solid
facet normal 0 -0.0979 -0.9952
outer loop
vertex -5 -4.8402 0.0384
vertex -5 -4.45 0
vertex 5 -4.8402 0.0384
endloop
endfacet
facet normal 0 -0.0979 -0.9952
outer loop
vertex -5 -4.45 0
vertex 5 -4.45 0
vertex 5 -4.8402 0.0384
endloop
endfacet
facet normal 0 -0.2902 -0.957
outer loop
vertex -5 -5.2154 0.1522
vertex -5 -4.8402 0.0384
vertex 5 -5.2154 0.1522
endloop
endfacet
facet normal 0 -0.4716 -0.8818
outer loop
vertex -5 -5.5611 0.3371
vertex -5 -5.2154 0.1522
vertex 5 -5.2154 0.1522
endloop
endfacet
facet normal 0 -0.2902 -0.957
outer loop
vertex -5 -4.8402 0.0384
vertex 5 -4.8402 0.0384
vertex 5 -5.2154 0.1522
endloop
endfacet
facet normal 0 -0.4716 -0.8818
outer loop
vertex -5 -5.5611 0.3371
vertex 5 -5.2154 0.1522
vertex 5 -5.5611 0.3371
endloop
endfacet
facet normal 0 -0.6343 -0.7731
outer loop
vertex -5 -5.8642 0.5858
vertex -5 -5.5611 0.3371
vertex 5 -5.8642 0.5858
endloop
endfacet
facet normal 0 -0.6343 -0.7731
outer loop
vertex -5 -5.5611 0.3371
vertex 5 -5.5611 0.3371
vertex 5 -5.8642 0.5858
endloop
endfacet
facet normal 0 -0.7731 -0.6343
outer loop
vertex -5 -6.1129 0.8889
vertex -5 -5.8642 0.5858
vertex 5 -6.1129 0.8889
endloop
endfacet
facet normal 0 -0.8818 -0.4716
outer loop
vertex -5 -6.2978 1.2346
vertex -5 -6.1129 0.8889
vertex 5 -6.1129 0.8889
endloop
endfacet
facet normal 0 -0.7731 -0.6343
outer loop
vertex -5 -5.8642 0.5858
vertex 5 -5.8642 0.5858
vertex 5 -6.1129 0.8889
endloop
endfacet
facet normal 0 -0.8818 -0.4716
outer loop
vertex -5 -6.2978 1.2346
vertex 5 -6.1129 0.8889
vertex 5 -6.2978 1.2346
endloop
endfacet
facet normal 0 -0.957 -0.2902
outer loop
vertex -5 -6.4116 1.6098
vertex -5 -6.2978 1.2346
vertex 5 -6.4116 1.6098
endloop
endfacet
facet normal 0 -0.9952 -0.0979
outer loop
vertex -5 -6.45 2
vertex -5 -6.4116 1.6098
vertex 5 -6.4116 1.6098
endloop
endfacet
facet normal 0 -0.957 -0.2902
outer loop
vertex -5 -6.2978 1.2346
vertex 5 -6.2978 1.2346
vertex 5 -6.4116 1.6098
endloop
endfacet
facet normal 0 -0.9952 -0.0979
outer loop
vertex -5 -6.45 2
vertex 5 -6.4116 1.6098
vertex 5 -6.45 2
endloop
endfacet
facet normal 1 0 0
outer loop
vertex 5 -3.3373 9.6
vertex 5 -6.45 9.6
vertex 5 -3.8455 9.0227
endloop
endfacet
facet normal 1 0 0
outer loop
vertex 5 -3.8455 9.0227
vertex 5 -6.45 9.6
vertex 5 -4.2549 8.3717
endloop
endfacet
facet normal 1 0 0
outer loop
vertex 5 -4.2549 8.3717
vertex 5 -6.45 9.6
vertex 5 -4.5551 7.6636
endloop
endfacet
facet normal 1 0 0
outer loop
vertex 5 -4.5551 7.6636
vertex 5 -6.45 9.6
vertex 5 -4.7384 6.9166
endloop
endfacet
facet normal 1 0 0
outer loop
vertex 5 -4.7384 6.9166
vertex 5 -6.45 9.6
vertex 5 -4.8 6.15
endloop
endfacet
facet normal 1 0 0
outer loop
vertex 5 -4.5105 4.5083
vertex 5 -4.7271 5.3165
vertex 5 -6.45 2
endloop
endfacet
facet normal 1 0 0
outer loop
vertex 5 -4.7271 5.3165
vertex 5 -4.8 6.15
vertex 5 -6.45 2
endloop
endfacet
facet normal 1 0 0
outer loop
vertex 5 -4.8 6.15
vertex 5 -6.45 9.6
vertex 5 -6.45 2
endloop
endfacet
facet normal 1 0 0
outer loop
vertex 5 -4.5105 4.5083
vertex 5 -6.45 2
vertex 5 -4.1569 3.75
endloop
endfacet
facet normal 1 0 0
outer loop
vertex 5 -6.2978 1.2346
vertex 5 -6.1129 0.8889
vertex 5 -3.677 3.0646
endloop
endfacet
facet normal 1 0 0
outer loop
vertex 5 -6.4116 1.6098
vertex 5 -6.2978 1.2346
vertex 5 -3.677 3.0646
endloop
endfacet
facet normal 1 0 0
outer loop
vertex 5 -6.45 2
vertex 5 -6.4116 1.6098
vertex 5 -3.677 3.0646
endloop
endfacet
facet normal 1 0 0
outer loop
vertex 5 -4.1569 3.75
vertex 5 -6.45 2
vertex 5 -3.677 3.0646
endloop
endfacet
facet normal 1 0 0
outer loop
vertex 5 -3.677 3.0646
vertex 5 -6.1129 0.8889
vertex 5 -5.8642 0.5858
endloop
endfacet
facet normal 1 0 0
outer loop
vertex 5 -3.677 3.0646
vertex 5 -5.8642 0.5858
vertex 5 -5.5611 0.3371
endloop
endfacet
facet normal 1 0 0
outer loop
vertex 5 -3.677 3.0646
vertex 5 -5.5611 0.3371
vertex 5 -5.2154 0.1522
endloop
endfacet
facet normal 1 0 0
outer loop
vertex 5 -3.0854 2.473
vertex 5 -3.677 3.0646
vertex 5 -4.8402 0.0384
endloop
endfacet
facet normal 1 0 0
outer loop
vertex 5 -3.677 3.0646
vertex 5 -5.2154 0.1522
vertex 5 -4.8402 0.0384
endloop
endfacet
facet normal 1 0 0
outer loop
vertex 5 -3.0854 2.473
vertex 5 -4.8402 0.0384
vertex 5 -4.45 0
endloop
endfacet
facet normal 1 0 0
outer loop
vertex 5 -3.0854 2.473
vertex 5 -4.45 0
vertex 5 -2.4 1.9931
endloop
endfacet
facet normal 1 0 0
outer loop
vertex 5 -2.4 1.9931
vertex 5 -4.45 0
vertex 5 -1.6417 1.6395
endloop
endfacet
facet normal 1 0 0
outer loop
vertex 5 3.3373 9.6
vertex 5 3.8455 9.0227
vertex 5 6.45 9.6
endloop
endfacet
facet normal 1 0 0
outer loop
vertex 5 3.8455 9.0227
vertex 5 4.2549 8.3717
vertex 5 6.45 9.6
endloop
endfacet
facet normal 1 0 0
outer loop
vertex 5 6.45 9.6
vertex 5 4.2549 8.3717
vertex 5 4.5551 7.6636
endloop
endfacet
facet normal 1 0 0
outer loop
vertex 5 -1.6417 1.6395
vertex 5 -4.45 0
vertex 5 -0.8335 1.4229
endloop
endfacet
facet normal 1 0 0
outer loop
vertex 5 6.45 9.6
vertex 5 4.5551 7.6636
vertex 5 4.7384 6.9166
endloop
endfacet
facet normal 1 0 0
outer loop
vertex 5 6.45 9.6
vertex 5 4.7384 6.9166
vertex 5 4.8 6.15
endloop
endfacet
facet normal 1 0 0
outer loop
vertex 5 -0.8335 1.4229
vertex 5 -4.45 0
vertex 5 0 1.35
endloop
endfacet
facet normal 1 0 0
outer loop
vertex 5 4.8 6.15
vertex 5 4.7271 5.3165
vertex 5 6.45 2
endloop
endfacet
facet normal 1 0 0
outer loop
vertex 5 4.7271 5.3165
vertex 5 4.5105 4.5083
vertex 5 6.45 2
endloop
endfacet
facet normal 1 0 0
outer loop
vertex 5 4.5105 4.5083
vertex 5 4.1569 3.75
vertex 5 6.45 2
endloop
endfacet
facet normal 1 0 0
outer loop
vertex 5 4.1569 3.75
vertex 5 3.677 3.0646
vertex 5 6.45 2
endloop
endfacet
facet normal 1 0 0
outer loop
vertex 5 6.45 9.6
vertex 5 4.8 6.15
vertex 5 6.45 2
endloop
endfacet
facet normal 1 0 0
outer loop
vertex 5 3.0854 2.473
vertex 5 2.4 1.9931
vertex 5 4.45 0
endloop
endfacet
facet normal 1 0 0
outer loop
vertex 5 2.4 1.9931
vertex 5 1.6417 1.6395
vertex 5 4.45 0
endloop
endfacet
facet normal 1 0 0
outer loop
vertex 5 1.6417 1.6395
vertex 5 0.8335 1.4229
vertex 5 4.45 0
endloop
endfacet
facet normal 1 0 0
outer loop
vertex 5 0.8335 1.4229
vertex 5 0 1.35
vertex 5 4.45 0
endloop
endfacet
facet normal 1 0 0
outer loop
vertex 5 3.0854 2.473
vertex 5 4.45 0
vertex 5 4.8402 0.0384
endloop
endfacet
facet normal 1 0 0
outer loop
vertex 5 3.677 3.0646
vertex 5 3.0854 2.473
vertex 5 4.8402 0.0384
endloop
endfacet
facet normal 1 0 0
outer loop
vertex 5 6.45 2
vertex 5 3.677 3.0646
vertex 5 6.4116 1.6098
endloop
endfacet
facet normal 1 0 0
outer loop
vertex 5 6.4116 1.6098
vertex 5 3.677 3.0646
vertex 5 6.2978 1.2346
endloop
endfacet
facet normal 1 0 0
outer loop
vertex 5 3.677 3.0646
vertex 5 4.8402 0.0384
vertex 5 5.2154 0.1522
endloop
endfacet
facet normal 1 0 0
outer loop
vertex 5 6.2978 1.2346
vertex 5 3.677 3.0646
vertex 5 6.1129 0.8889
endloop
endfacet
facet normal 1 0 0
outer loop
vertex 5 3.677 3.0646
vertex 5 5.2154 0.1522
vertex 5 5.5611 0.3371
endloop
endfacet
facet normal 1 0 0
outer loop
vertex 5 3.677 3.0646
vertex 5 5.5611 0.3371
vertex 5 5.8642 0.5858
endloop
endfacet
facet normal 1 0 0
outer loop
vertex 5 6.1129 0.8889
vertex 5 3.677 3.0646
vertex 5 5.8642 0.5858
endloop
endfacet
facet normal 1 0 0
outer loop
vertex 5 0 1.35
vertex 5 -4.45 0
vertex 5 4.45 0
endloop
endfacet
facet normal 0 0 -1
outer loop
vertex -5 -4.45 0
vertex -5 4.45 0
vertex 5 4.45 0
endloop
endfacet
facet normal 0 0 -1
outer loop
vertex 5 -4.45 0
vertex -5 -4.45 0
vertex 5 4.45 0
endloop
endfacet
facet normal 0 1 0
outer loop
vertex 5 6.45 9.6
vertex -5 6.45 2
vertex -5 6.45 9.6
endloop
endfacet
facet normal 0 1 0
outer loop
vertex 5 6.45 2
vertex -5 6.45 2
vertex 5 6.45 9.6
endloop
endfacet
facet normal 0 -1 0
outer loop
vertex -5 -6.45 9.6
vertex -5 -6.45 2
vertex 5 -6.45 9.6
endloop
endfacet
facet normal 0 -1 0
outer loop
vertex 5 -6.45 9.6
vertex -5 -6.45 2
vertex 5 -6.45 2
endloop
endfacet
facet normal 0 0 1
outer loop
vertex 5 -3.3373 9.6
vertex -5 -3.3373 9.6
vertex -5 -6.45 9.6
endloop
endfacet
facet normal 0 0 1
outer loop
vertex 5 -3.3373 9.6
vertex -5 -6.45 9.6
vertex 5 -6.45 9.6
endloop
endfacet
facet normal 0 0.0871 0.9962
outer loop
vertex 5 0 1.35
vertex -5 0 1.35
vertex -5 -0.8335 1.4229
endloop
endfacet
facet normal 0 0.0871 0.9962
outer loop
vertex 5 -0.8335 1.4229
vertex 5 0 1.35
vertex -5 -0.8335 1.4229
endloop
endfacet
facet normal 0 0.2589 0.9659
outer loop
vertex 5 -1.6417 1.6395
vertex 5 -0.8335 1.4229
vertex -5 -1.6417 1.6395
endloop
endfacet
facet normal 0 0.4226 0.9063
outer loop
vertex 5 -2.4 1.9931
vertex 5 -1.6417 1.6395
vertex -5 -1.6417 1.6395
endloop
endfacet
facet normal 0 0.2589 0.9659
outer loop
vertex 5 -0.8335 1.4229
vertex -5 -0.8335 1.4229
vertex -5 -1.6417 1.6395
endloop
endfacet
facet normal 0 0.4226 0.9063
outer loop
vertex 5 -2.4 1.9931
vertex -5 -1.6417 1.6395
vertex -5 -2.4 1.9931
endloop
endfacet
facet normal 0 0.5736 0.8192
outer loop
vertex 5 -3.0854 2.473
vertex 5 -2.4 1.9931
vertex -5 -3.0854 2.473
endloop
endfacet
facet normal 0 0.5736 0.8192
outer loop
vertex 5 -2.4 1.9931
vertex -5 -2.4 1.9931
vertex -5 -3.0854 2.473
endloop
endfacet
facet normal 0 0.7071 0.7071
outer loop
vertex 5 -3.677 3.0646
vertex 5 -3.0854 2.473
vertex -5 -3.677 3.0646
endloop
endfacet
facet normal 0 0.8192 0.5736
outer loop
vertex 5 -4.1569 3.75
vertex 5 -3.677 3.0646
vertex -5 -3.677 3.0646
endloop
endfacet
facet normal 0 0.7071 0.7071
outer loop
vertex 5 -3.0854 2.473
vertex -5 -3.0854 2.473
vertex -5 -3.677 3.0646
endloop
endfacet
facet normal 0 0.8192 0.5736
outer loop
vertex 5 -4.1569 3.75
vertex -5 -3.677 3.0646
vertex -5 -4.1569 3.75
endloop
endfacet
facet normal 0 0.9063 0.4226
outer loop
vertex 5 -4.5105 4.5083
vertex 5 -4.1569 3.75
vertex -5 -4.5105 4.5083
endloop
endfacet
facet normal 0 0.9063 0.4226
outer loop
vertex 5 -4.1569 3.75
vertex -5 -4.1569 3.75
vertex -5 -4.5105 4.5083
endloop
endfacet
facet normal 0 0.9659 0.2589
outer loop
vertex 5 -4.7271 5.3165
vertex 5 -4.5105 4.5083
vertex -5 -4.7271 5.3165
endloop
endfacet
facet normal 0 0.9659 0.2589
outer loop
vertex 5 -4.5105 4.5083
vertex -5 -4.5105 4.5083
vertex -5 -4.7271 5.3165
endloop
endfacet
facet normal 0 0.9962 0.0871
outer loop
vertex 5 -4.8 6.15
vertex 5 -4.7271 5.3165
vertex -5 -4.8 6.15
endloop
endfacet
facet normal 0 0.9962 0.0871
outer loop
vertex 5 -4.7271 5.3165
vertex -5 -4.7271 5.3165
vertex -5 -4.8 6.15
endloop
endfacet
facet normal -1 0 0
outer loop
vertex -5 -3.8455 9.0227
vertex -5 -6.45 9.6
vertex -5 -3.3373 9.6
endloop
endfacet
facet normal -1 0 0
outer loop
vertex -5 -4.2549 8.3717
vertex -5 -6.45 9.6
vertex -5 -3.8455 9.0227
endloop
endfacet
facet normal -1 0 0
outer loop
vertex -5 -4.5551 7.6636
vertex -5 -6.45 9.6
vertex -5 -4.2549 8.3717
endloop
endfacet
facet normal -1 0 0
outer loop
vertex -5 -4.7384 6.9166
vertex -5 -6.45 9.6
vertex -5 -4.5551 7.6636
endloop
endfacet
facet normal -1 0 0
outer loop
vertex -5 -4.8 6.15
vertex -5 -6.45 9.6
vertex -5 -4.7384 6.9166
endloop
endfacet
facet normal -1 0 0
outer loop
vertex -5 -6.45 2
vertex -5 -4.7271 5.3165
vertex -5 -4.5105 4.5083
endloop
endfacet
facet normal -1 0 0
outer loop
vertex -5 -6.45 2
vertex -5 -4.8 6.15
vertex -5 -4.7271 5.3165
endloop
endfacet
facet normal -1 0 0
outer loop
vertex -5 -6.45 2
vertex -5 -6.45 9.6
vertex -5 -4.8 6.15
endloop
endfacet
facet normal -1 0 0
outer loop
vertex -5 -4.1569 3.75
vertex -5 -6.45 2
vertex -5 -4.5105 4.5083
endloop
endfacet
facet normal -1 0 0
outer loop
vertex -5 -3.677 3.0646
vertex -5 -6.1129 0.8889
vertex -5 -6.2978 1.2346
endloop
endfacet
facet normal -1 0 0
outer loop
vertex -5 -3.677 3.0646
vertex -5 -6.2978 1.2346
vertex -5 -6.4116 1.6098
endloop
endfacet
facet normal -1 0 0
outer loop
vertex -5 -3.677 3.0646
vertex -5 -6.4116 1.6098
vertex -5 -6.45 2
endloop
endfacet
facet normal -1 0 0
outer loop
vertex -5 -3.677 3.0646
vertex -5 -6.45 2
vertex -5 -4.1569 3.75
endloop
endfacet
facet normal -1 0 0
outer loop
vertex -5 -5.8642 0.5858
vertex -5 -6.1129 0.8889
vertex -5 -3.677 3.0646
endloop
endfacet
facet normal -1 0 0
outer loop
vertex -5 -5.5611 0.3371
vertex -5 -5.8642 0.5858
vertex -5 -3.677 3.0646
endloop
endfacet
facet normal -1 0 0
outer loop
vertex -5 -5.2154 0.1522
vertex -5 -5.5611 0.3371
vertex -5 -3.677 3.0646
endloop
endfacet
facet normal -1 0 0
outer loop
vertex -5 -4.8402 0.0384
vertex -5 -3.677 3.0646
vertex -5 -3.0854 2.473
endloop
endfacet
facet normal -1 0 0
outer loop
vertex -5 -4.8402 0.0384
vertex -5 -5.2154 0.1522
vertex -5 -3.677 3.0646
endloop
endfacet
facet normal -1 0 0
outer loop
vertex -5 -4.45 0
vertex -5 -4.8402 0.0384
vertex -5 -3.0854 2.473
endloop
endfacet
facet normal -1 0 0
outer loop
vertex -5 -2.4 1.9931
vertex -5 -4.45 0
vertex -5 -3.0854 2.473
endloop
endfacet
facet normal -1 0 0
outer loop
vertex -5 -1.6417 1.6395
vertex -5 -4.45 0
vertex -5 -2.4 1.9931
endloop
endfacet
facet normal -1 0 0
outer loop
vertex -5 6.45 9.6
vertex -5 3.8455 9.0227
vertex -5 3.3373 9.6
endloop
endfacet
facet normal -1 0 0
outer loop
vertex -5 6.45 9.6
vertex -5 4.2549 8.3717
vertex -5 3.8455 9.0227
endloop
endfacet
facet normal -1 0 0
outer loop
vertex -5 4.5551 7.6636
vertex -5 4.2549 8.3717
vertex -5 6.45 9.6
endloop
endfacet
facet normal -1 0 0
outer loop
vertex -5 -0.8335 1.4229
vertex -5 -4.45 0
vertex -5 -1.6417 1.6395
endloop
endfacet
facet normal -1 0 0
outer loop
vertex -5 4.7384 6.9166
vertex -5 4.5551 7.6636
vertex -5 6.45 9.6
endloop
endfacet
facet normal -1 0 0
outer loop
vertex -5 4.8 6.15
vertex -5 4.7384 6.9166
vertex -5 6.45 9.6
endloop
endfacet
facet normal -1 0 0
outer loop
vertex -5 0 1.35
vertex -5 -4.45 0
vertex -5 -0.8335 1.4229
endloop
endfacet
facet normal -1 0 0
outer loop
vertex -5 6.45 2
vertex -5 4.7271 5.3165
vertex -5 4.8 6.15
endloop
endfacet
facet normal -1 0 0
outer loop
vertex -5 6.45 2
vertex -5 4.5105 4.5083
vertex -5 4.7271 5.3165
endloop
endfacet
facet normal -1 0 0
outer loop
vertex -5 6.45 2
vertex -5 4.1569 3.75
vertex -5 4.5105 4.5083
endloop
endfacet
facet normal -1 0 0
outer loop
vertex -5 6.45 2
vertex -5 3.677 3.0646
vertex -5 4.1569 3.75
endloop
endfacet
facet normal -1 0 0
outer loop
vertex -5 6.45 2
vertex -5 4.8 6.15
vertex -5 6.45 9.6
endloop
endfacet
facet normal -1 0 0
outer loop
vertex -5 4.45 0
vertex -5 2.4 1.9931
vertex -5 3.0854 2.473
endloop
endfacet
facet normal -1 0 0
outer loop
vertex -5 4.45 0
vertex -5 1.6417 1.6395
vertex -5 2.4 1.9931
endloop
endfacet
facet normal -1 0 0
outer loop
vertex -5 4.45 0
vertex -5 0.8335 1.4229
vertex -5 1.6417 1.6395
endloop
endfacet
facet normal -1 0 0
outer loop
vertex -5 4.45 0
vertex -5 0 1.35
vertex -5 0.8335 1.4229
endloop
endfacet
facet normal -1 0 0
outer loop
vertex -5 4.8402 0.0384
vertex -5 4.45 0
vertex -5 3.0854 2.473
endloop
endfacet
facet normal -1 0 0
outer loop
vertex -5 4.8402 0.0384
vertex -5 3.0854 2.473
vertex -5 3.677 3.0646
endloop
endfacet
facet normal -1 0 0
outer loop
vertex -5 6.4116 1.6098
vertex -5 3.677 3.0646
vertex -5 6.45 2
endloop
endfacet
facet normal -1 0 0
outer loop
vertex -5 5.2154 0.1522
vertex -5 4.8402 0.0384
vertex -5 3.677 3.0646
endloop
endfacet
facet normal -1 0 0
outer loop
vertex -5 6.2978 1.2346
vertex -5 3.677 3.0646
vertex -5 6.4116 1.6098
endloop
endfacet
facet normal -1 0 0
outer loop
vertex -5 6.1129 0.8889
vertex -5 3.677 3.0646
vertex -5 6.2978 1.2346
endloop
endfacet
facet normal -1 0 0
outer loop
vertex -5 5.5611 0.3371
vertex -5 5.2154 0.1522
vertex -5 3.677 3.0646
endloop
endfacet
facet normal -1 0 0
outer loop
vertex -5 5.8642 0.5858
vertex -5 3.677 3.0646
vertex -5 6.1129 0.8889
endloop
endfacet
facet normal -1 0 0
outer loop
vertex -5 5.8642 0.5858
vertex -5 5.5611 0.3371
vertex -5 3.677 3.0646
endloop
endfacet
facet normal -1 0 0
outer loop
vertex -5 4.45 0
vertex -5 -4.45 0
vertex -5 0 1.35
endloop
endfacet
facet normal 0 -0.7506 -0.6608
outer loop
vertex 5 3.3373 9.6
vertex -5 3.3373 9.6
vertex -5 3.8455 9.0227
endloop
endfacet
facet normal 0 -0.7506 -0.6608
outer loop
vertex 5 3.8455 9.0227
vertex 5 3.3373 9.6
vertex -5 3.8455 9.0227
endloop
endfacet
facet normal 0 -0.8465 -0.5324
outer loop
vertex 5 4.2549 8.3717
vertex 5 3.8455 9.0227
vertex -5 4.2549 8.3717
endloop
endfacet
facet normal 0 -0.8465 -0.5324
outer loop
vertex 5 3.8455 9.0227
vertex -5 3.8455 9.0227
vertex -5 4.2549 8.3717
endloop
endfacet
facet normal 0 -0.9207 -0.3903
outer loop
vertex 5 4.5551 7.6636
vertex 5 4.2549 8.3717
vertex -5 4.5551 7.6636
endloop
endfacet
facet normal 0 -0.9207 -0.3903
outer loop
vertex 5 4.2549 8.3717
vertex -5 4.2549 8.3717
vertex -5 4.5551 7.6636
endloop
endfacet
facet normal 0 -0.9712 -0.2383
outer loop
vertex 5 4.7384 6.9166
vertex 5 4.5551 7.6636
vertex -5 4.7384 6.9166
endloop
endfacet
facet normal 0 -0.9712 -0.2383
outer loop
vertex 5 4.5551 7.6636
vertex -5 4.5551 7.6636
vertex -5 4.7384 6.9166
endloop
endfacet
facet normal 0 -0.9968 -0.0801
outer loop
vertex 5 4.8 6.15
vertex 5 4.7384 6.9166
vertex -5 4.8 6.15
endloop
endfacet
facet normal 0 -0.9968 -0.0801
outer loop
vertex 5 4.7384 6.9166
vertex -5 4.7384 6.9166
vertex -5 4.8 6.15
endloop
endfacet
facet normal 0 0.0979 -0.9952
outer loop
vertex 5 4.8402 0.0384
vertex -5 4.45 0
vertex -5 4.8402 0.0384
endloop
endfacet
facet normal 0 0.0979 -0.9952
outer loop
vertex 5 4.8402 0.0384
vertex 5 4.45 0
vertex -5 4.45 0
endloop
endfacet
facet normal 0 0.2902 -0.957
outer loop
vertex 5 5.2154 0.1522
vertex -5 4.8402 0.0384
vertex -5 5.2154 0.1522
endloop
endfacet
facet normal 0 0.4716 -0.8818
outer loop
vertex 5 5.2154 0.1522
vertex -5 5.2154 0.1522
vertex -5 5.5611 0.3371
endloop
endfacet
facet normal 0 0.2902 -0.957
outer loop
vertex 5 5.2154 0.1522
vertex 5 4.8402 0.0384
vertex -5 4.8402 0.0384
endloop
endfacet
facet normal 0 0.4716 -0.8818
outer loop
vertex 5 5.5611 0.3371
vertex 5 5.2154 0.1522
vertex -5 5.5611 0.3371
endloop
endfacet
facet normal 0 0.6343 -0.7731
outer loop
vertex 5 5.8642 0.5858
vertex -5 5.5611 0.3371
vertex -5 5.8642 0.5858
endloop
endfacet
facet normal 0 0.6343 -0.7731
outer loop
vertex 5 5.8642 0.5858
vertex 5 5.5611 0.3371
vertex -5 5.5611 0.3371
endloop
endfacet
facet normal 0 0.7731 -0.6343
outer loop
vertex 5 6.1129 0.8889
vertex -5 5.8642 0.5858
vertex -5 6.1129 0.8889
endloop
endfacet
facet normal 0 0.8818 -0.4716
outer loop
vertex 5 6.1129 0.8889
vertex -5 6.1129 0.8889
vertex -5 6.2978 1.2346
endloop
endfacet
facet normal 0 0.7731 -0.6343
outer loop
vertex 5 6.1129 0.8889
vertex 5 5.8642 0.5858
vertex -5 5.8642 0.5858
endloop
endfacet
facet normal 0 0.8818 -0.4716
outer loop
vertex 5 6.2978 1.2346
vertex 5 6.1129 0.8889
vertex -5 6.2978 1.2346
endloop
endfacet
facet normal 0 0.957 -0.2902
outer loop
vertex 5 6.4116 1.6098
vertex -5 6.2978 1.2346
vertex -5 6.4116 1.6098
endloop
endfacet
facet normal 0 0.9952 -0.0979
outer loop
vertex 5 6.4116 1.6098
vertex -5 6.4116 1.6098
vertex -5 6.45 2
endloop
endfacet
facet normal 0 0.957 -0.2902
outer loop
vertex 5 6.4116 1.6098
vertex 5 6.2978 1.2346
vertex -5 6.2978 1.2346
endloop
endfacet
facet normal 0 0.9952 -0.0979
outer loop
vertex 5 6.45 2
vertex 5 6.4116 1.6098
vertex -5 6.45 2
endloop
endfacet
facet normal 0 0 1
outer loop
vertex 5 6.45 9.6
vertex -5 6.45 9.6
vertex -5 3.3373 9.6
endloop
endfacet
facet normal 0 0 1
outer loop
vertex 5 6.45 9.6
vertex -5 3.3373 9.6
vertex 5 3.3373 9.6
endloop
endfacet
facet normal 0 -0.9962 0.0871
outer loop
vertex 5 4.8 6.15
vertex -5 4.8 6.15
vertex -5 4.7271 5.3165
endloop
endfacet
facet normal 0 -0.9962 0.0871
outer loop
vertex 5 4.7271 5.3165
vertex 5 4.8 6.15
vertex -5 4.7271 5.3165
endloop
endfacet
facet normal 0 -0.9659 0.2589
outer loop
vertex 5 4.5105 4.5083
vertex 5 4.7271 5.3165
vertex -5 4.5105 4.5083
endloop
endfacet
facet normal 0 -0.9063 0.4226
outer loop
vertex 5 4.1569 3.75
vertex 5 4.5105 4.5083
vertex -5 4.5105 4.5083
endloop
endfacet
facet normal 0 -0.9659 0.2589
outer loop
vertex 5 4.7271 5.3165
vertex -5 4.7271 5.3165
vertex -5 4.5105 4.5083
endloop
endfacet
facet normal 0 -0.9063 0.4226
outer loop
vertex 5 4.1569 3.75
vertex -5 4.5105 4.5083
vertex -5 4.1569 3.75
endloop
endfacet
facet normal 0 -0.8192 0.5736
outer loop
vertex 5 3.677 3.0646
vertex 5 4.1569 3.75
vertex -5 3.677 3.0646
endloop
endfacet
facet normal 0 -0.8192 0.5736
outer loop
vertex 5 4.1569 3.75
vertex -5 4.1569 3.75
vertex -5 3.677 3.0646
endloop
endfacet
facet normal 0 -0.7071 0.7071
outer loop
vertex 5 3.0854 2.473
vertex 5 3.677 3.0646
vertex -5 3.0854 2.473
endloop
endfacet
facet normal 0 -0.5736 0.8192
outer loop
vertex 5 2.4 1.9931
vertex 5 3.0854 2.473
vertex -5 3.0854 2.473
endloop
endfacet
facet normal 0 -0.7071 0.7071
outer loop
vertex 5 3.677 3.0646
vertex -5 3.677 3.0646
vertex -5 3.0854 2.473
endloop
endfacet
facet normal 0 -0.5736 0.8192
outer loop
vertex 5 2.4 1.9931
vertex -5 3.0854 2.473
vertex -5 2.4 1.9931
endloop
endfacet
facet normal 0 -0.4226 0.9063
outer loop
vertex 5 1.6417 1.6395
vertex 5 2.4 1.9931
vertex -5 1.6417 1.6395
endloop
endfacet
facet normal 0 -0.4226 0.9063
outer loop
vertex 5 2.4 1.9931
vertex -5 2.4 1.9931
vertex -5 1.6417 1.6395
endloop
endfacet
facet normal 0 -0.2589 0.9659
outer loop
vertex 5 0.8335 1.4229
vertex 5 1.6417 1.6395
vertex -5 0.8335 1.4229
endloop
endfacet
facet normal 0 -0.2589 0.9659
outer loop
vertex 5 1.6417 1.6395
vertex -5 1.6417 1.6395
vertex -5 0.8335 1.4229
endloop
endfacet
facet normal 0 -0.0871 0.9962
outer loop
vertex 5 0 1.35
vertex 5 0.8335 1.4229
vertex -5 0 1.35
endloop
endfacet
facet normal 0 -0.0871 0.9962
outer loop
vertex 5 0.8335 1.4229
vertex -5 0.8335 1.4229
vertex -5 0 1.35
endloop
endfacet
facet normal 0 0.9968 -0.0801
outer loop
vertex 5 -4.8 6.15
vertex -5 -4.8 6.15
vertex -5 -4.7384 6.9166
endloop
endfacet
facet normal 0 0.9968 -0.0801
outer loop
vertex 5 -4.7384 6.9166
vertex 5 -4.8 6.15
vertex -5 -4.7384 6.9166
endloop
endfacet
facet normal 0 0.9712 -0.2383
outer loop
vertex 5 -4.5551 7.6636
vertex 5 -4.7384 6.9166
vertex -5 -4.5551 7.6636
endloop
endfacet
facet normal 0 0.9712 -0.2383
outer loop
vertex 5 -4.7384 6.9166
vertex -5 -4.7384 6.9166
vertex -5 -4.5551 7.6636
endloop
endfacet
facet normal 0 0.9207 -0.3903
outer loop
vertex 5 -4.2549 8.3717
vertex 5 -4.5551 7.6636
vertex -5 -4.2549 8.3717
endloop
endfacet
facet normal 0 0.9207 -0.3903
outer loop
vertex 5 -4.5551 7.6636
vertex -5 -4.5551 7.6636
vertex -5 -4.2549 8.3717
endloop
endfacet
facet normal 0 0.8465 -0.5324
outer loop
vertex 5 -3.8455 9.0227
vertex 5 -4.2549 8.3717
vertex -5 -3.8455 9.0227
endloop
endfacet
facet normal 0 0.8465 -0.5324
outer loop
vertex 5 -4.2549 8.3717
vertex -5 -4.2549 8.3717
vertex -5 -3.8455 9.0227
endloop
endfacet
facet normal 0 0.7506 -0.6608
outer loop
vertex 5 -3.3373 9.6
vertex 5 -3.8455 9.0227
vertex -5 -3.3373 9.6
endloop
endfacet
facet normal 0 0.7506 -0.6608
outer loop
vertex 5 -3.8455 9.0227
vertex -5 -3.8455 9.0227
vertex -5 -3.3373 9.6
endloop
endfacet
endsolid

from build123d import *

# Parameters (mm, degrees)
F0_W     = 10
F0_H     = 12.9
F1_DEPTH = 9.6
F3_DEPTH = 10.001
F4_R     = 2


with BuildPart() as f1:
    # F0 (on Top) → F1 (new body)
    with BuildSketch(Plane.XY):
        Rectangle(F0_W, F0_H)
    extrude(amount=F1_DEPTH)

    # F2 (on face) → F3 (cut, through all)
    with BuildSketch(Plane(origin=(-5, 0, 0), x_dir=(0, -1, 0), z_dir=(-1, 0, 0))):
        with BuildLine():
            Line((-4.8, 6.15), (0, 6.15))
            Line((0, 6.15), (4.8, 6.15))
            ThreePointArc((4.8, 6.15), (4.419219, 8.023634), (3.337289, 9.6))
            Line((3.337289, 9.6), (-3.337289, 9.6))
            ThreePointArc((-3.337289, 9.6), (-4.419219, 8.023634), (-4.8, 6.15))
        make_face()
        with BuildLine():
            ThreePointArc((-4.8, 6.15), (-3.394113, 2.755887), (0, 1.35))
            Line((0, 1.35), (0, 6.15))
            Line((0, 6.15), (-4.8, 6.15))
        make_face()
        with BuildLine():
            Line((0, 6.15), (0, 1.35))
            ThreePointArc((0, 1.35), (3.394113, 2.755887), (4.8, 6.15))
            Line((4.8, 6.15), (0, 6.15))
        make_face()
    extrude(amount=-F3_DEPTH, mode=Mode.SUBTRACT)

    # F4
    f4_edges = [f1.edges().sort_by_distance(p)[0] for p in [
        (0, -6.45, 0),
        (0, 6.45, 0),
    ]]
    fillet(f4_edges, radius=F4_R)


solid = f1.part
